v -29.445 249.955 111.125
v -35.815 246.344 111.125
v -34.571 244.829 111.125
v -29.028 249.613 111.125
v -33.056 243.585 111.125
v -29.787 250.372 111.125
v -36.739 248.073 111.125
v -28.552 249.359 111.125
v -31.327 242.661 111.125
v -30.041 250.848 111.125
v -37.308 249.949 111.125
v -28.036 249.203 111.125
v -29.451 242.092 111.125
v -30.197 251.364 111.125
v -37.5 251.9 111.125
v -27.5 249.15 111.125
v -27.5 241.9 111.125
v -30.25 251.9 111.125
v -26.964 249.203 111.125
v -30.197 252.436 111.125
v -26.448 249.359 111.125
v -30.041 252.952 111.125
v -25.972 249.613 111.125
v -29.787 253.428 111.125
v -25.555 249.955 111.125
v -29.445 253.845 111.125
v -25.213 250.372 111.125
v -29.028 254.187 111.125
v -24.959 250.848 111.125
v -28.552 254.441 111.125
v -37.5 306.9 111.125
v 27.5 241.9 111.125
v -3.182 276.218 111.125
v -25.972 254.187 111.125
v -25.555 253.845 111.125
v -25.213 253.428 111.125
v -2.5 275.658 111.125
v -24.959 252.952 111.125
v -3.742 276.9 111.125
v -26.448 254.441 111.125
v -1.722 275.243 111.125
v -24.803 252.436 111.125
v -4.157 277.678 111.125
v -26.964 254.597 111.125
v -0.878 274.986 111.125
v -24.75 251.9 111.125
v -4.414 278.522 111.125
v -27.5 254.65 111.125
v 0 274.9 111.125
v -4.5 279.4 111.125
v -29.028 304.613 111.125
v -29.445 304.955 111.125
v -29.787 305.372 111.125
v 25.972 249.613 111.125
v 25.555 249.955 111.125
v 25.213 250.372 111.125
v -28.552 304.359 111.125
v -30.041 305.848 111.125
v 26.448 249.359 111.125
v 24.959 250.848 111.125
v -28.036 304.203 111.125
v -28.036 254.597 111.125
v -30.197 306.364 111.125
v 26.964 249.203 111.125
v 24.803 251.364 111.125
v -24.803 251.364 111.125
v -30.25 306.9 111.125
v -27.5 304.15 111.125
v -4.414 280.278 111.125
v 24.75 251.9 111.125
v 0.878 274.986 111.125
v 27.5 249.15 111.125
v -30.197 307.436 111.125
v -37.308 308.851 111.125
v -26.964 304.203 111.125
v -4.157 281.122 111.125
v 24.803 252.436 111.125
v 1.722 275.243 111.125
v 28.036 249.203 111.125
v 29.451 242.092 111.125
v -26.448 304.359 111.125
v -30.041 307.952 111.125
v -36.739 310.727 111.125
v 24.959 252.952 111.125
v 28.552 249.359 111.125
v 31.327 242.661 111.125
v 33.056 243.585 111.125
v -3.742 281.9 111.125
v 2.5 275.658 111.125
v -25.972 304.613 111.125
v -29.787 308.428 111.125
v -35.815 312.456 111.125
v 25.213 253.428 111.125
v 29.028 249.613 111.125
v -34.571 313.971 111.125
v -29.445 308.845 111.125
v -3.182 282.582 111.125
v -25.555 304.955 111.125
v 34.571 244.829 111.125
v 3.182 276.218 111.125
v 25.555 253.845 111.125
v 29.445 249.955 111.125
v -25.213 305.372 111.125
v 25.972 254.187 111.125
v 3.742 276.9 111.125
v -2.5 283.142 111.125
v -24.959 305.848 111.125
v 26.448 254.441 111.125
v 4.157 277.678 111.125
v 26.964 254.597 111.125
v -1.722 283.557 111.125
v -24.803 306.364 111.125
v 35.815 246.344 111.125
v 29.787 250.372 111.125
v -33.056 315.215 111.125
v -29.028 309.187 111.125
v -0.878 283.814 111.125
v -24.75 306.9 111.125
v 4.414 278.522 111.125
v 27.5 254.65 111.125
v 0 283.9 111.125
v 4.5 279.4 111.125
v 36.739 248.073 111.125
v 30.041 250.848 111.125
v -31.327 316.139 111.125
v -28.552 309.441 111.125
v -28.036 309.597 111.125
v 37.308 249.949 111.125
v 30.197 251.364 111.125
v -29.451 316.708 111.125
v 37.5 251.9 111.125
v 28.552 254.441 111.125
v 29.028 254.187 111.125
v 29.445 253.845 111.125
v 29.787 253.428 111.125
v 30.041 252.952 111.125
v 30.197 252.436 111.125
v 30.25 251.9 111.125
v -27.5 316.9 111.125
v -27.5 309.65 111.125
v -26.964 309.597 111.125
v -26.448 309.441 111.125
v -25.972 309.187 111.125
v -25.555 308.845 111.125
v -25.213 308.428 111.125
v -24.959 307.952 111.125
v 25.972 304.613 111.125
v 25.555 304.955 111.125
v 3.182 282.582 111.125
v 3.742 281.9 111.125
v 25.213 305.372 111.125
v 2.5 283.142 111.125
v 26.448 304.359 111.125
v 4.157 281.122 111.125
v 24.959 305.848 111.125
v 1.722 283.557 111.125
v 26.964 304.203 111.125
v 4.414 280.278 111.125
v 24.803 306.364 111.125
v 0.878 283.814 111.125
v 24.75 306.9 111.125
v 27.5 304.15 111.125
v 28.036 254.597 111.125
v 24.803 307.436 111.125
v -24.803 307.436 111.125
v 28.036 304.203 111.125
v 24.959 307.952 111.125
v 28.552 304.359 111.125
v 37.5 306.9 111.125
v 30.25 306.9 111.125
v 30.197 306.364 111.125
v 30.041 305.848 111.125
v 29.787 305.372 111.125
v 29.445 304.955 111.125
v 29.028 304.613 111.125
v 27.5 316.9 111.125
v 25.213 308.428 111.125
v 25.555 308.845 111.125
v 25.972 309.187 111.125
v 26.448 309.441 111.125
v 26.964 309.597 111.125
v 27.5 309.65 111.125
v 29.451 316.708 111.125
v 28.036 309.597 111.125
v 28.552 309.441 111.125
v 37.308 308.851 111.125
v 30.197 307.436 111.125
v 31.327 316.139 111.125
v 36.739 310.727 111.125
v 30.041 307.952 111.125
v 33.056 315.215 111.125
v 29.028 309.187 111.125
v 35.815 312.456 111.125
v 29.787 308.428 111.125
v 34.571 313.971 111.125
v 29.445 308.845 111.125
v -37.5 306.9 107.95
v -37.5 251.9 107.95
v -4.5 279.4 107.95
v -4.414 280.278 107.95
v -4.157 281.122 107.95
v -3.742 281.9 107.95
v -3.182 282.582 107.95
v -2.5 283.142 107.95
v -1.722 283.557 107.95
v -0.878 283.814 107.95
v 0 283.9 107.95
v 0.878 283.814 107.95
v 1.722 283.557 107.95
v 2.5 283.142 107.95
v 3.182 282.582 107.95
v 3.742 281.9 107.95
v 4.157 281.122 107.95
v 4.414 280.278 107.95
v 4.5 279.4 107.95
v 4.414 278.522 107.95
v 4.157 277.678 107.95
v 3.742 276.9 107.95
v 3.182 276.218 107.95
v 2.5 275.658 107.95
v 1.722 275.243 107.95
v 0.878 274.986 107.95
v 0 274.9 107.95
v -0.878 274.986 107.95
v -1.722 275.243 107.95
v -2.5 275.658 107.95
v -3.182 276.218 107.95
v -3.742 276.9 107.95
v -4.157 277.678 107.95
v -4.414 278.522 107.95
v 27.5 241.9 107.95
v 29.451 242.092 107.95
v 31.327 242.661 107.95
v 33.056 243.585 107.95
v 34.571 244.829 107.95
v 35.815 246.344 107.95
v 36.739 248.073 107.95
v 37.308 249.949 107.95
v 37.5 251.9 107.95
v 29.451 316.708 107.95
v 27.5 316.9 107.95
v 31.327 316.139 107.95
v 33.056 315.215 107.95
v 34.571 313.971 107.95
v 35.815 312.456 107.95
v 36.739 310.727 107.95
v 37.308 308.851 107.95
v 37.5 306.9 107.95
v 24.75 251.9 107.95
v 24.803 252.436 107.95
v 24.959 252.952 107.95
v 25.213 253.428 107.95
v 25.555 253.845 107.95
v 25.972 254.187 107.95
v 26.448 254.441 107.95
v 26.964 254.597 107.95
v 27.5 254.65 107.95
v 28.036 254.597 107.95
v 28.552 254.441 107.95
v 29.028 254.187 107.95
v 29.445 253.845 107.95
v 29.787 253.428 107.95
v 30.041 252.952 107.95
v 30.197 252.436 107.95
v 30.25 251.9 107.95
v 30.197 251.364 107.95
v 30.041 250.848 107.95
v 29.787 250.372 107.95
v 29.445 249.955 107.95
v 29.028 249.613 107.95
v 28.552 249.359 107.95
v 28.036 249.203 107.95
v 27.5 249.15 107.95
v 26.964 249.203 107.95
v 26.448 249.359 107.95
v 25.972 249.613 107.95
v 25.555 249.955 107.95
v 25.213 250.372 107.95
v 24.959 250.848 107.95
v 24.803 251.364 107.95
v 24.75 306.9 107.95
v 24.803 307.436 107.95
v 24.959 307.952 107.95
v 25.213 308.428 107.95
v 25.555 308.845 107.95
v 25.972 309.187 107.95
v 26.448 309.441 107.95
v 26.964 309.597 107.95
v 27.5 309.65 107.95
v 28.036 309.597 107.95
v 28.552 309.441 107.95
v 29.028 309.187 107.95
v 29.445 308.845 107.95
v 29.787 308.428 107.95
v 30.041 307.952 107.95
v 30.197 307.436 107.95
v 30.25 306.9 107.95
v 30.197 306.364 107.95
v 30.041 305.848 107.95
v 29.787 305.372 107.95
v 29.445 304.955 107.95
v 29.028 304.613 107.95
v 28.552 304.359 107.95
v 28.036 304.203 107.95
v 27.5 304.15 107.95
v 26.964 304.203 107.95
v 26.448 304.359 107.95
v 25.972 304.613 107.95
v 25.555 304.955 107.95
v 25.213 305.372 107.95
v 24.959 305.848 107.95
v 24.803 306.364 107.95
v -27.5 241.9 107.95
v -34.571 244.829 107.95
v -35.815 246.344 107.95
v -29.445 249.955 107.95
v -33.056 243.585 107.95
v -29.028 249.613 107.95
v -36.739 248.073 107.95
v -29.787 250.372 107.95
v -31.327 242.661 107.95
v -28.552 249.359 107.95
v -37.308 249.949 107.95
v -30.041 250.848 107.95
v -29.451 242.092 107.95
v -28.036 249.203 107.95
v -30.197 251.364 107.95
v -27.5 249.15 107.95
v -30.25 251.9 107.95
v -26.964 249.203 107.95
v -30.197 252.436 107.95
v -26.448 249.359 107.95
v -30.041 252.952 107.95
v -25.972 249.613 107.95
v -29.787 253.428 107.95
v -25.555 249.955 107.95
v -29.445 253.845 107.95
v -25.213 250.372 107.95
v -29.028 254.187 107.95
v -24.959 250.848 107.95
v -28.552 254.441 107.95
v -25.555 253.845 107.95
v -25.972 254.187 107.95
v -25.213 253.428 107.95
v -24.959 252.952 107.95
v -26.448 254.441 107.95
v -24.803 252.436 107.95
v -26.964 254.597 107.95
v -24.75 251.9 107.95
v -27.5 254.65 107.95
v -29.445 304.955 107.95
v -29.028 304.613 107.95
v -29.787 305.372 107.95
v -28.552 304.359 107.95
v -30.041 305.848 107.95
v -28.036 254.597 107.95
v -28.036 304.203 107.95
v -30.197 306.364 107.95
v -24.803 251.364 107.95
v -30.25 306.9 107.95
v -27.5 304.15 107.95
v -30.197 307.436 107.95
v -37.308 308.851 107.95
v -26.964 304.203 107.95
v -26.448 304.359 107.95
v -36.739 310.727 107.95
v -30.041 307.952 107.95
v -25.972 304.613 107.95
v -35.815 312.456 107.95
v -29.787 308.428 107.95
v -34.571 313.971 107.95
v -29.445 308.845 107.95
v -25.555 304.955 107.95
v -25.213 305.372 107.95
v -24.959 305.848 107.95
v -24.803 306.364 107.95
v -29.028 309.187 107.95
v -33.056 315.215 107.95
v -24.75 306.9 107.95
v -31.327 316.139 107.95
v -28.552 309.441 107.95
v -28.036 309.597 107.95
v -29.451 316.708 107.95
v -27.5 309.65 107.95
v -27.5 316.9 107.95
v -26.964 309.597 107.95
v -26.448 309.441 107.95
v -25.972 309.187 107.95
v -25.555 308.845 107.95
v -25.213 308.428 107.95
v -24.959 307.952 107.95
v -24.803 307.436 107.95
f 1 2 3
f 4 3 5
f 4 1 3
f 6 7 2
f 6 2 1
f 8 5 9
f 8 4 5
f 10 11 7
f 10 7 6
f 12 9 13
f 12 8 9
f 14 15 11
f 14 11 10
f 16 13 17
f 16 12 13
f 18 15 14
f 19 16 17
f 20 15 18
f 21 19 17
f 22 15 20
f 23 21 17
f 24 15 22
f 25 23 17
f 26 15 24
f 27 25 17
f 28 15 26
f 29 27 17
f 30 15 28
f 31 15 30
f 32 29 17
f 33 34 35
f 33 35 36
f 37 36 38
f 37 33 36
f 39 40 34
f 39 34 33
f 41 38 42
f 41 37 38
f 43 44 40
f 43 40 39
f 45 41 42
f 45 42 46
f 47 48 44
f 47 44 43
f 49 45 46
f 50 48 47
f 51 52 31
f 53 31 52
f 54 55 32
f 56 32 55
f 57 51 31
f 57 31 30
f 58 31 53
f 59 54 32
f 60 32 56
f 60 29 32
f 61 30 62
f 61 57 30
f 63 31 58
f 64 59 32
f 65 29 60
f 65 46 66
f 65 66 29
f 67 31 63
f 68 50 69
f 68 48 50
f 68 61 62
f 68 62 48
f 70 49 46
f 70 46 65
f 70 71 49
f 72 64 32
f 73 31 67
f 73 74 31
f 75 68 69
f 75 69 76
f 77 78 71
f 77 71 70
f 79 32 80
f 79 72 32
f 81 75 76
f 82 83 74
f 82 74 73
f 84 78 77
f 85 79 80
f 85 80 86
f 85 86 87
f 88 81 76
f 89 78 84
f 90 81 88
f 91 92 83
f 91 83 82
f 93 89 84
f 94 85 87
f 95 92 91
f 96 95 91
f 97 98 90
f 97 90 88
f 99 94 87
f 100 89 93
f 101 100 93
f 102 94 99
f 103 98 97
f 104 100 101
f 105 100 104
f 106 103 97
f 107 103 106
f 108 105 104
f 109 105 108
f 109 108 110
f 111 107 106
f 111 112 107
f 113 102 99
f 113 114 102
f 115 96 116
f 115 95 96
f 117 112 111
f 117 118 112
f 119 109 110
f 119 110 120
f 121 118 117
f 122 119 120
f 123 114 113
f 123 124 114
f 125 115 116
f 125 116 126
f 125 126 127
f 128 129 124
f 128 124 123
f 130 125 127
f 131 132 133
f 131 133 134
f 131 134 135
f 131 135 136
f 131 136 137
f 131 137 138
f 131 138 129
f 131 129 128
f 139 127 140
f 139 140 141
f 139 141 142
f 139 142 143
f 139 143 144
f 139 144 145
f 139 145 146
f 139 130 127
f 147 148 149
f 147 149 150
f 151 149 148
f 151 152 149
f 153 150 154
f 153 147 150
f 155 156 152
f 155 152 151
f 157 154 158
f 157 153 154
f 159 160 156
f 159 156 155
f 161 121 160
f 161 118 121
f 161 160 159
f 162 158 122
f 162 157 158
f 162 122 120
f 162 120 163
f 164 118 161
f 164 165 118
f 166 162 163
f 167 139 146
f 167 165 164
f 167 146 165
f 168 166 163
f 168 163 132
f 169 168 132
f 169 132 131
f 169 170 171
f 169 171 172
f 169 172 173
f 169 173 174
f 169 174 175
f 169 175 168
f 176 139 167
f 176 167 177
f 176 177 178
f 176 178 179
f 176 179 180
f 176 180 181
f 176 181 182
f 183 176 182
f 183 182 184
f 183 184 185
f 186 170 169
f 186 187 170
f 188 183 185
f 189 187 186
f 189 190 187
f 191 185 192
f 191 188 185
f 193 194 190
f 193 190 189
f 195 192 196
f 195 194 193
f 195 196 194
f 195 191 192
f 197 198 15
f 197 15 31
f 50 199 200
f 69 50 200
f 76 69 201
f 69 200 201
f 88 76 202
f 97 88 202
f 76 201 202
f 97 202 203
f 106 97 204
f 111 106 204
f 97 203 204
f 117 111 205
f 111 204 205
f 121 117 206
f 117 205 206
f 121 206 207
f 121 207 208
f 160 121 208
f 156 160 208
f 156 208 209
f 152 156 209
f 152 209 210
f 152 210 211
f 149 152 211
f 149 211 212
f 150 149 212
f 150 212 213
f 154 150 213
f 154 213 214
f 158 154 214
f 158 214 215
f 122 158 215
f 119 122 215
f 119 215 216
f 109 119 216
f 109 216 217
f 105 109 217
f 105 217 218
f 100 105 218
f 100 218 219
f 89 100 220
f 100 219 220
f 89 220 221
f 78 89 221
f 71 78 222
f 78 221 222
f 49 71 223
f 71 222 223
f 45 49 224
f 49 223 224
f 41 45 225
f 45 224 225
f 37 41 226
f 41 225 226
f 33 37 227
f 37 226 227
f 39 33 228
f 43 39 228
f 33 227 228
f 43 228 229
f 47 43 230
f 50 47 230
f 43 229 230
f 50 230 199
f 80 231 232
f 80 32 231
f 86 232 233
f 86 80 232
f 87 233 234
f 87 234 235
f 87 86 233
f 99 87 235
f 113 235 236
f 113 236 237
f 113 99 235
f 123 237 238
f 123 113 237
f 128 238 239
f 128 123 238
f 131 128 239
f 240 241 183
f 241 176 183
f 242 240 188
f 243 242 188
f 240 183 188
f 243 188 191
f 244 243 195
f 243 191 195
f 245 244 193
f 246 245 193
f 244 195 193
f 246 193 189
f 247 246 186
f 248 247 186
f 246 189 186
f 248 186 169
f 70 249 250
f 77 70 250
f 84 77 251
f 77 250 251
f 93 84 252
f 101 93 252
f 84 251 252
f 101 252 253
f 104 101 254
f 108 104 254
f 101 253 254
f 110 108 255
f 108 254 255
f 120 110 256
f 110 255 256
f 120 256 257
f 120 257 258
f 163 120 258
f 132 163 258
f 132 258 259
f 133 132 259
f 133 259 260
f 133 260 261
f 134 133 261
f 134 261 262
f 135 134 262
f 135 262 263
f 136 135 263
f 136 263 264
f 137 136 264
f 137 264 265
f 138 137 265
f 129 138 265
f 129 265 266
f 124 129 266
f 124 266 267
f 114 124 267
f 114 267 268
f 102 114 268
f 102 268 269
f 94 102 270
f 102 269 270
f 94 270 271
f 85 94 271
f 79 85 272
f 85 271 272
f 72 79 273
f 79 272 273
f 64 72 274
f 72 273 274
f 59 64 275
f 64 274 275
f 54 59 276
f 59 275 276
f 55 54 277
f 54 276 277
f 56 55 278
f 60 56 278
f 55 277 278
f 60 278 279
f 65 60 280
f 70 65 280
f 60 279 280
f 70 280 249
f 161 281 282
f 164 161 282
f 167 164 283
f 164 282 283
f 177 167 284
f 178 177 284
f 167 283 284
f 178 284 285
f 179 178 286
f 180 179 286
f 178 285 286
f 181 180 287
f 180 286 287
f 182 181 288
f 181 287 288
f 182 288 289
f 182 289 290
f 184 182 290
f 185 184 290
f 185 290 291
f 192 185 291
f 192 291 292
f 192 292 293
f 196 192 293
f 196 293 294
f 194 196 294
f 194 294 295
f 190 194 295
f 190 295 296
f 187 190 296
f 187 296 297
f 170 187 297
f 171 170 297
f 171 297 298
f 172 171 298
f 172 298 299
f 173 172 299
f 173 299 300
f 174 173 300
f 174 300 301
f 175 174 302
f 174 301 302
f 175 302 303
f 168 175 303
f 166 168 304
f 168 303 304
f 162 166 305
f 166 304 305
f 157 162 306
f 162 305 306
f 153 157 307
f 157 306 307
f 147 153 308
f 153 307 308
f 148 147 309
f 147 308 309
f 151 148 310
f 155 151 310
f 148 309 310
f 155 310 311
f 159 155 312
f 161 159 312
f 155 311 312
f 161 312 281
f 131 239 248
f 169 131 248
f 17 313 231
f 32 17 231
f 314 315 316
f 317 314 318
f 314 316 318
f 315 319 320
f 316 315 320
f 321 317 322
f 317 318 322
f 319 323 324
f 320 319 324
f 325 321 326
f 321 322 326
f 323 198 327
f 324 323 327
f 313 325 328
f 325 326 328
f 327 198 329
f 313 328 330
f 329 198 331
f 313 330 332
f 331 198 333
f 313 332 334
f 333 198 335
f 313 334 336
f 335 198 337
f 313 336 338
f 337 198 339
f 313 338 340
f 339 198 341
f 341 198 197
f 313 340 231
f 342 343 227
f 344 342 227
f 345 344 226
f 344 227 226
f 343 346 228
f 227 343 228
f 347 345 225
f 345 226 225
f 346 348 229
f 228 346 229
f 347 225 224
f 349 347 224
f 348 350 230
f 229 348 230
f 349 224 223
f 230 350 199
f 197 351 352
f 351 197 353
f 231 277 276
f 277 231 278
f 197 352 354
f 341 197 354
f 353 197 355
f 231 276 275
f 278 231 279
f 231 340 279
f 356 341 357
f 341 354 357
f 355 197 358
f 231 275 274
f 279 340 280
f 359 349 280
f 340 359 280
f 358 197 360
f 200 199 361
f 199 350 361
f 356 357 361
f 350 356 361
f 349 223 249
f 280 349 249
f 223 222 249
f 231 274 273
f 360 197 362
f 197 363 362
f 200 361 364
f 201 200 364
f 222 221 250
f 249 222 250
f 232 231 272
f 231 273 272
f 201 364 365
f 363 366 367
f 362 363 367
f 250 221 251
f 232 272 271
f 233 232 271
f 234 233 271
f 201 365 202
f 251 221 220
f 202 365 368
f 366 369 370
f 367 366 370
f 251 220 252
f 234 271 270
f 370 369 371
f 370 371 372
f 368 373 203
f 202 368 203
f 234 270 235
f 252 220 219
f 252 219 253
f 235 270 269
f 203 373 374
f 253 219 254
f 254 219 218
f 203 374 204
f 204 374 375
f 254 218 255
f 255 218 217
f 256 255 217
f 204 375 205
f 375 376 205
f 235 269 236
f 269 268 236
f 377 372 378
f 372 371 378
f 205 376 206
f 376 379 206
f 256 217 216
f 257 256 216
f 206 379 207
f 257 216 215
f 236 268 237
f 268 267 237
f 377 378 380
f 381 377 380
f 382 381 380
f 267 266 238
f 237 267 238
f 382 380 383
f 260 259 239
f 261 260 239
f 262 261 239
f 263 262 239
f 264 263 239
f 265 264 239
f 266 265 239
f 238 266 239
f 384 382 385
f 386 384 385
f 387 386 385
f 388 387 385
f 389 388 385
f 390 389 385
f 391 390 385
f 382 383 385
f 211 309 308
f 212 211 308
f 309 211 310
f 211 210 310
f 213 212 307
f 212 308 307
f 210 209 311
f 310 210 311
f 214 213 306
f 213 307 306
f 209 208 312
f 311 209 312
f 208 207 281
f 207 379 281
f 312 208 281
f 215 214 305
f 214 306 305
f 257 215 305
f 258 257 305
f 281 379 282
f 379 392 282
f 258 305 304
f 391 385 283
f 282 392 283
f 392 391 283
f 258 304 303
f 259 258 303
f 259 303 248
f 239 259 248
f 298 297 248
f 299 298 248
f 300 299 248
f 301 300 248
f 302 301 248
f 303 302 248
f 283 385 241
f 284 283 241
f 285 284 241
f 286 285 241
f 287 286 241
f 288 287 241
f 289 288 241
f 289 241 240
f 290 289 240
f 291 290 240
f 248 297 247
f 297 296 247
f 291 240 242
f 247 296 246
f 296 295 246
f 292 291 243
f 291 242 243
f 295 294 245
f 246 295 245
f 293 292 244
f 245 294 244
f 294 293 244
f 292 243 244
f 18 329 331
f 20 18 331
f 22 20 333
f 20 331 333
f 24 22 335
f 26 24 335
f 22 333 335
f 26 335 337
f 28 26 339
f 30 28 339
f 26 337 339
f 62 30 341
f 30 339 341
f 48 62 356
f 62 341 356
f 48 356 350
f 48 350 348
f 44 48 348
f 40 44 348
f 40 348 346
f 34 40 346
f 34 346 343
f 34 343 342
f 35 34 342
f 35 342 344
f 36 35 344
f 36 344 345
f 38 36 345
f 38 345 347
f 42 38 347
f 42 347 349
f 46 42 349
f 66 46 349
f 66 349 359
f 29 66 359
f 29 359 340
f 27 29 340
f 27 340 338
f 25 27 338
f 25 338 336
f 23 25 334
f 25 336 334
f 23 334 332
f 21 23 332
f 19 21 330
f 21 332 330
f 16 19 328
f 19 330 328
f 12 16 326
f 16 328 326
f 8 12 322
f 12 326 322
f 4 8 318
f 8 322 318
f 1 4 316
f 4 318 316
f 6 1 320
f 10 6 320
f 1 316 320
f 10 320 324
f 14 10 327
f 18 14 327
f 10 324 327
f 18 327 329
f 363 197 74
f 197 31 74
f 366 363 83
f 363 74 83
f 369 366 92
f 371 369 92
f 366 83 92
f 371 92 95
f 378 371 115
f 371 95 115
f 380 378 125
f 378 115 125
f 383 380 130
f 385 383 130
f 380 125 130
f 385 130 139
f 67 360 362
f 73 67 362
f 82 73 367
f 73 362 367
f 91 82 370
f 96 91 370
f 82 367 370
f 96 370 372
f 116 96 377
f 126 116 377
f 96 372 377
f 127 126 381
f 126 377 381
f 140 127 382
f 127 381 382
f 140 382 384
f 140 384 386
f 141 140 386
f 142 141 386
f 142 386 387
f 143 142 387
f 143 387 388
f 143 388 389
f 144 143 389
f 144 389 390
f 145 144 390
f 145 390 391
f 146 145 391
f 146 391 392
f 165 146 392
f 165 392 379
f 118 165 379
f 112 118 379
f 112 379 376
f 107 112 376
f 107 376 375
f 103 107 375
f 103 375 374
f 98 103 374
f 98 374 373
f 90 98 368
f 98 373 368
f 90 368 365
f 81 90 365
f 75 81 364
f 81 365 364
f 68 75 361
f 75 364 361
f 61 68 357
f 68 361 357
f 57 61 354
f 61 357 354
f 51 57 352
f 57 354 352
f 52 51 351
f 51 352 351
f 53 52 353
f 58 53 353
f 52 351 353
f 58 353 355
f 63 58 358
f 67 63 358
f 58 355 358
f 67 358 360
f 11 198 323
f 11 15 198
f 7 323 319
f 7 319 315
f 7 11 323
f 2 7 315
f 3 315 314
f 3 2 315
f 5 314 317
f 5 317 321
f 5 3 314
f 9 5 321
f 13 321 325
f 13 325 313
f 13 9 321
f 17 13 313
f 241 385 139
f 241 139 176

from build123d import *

# Parameters (mm, degrees)
SKETCH1_W            = 75
SKETCH1_H            = 75
BOSS_EXTRUDE1_DEPTH  = 3.175
M8_CLEARANCE_HOLE1_D = 9
M5_CLEARANCE_HOLE1_D = 5.5
FILLET1_R            = 10


with BuildPart() as part:
    # Sketch1 → Boss-Extrude1 (new body)
    with BuildSketch(Plane.XY.offset(107.95)):
        with Locations((0, 279.4)):
            Rectangle(SKETCH1_W, SKETCH1_H)
    extrude(amount=BOSS_EXTRUDE1_DEPTH)

    # M8 Clearance Hole1 (through all)
    with Locations(Plane.XY.offset(111.125)):
        with Locations((0, 279.4)):
            Hole(M8_CLEARANCE_HOLE1_D / 2)

    # M5 Clearance Hole1 (through all)
    with Locations(Plane.XY.offset(111.125)):
        with Locations((-27.5, 306.9), (27.5, 306.9), (27.5, 251.9), (-27.5, 251.9)):
            Hole(M5_CLEARANCE_HOLE1_D / 2)

    # Fillet1
    fillet1_edges = [part.edges().sort_by_distance(p)[0] for p in [
        (37.5, 241.9, 109.5375),
        (-37.5, 241.9, 109.5375),
        (-37.5, 316.9, 109.5375),
        (37.5, 316.9, 109.5375),
    ]]
    fillet(fillet1_edges, radius=FILLET1_R)


solid = part.part
